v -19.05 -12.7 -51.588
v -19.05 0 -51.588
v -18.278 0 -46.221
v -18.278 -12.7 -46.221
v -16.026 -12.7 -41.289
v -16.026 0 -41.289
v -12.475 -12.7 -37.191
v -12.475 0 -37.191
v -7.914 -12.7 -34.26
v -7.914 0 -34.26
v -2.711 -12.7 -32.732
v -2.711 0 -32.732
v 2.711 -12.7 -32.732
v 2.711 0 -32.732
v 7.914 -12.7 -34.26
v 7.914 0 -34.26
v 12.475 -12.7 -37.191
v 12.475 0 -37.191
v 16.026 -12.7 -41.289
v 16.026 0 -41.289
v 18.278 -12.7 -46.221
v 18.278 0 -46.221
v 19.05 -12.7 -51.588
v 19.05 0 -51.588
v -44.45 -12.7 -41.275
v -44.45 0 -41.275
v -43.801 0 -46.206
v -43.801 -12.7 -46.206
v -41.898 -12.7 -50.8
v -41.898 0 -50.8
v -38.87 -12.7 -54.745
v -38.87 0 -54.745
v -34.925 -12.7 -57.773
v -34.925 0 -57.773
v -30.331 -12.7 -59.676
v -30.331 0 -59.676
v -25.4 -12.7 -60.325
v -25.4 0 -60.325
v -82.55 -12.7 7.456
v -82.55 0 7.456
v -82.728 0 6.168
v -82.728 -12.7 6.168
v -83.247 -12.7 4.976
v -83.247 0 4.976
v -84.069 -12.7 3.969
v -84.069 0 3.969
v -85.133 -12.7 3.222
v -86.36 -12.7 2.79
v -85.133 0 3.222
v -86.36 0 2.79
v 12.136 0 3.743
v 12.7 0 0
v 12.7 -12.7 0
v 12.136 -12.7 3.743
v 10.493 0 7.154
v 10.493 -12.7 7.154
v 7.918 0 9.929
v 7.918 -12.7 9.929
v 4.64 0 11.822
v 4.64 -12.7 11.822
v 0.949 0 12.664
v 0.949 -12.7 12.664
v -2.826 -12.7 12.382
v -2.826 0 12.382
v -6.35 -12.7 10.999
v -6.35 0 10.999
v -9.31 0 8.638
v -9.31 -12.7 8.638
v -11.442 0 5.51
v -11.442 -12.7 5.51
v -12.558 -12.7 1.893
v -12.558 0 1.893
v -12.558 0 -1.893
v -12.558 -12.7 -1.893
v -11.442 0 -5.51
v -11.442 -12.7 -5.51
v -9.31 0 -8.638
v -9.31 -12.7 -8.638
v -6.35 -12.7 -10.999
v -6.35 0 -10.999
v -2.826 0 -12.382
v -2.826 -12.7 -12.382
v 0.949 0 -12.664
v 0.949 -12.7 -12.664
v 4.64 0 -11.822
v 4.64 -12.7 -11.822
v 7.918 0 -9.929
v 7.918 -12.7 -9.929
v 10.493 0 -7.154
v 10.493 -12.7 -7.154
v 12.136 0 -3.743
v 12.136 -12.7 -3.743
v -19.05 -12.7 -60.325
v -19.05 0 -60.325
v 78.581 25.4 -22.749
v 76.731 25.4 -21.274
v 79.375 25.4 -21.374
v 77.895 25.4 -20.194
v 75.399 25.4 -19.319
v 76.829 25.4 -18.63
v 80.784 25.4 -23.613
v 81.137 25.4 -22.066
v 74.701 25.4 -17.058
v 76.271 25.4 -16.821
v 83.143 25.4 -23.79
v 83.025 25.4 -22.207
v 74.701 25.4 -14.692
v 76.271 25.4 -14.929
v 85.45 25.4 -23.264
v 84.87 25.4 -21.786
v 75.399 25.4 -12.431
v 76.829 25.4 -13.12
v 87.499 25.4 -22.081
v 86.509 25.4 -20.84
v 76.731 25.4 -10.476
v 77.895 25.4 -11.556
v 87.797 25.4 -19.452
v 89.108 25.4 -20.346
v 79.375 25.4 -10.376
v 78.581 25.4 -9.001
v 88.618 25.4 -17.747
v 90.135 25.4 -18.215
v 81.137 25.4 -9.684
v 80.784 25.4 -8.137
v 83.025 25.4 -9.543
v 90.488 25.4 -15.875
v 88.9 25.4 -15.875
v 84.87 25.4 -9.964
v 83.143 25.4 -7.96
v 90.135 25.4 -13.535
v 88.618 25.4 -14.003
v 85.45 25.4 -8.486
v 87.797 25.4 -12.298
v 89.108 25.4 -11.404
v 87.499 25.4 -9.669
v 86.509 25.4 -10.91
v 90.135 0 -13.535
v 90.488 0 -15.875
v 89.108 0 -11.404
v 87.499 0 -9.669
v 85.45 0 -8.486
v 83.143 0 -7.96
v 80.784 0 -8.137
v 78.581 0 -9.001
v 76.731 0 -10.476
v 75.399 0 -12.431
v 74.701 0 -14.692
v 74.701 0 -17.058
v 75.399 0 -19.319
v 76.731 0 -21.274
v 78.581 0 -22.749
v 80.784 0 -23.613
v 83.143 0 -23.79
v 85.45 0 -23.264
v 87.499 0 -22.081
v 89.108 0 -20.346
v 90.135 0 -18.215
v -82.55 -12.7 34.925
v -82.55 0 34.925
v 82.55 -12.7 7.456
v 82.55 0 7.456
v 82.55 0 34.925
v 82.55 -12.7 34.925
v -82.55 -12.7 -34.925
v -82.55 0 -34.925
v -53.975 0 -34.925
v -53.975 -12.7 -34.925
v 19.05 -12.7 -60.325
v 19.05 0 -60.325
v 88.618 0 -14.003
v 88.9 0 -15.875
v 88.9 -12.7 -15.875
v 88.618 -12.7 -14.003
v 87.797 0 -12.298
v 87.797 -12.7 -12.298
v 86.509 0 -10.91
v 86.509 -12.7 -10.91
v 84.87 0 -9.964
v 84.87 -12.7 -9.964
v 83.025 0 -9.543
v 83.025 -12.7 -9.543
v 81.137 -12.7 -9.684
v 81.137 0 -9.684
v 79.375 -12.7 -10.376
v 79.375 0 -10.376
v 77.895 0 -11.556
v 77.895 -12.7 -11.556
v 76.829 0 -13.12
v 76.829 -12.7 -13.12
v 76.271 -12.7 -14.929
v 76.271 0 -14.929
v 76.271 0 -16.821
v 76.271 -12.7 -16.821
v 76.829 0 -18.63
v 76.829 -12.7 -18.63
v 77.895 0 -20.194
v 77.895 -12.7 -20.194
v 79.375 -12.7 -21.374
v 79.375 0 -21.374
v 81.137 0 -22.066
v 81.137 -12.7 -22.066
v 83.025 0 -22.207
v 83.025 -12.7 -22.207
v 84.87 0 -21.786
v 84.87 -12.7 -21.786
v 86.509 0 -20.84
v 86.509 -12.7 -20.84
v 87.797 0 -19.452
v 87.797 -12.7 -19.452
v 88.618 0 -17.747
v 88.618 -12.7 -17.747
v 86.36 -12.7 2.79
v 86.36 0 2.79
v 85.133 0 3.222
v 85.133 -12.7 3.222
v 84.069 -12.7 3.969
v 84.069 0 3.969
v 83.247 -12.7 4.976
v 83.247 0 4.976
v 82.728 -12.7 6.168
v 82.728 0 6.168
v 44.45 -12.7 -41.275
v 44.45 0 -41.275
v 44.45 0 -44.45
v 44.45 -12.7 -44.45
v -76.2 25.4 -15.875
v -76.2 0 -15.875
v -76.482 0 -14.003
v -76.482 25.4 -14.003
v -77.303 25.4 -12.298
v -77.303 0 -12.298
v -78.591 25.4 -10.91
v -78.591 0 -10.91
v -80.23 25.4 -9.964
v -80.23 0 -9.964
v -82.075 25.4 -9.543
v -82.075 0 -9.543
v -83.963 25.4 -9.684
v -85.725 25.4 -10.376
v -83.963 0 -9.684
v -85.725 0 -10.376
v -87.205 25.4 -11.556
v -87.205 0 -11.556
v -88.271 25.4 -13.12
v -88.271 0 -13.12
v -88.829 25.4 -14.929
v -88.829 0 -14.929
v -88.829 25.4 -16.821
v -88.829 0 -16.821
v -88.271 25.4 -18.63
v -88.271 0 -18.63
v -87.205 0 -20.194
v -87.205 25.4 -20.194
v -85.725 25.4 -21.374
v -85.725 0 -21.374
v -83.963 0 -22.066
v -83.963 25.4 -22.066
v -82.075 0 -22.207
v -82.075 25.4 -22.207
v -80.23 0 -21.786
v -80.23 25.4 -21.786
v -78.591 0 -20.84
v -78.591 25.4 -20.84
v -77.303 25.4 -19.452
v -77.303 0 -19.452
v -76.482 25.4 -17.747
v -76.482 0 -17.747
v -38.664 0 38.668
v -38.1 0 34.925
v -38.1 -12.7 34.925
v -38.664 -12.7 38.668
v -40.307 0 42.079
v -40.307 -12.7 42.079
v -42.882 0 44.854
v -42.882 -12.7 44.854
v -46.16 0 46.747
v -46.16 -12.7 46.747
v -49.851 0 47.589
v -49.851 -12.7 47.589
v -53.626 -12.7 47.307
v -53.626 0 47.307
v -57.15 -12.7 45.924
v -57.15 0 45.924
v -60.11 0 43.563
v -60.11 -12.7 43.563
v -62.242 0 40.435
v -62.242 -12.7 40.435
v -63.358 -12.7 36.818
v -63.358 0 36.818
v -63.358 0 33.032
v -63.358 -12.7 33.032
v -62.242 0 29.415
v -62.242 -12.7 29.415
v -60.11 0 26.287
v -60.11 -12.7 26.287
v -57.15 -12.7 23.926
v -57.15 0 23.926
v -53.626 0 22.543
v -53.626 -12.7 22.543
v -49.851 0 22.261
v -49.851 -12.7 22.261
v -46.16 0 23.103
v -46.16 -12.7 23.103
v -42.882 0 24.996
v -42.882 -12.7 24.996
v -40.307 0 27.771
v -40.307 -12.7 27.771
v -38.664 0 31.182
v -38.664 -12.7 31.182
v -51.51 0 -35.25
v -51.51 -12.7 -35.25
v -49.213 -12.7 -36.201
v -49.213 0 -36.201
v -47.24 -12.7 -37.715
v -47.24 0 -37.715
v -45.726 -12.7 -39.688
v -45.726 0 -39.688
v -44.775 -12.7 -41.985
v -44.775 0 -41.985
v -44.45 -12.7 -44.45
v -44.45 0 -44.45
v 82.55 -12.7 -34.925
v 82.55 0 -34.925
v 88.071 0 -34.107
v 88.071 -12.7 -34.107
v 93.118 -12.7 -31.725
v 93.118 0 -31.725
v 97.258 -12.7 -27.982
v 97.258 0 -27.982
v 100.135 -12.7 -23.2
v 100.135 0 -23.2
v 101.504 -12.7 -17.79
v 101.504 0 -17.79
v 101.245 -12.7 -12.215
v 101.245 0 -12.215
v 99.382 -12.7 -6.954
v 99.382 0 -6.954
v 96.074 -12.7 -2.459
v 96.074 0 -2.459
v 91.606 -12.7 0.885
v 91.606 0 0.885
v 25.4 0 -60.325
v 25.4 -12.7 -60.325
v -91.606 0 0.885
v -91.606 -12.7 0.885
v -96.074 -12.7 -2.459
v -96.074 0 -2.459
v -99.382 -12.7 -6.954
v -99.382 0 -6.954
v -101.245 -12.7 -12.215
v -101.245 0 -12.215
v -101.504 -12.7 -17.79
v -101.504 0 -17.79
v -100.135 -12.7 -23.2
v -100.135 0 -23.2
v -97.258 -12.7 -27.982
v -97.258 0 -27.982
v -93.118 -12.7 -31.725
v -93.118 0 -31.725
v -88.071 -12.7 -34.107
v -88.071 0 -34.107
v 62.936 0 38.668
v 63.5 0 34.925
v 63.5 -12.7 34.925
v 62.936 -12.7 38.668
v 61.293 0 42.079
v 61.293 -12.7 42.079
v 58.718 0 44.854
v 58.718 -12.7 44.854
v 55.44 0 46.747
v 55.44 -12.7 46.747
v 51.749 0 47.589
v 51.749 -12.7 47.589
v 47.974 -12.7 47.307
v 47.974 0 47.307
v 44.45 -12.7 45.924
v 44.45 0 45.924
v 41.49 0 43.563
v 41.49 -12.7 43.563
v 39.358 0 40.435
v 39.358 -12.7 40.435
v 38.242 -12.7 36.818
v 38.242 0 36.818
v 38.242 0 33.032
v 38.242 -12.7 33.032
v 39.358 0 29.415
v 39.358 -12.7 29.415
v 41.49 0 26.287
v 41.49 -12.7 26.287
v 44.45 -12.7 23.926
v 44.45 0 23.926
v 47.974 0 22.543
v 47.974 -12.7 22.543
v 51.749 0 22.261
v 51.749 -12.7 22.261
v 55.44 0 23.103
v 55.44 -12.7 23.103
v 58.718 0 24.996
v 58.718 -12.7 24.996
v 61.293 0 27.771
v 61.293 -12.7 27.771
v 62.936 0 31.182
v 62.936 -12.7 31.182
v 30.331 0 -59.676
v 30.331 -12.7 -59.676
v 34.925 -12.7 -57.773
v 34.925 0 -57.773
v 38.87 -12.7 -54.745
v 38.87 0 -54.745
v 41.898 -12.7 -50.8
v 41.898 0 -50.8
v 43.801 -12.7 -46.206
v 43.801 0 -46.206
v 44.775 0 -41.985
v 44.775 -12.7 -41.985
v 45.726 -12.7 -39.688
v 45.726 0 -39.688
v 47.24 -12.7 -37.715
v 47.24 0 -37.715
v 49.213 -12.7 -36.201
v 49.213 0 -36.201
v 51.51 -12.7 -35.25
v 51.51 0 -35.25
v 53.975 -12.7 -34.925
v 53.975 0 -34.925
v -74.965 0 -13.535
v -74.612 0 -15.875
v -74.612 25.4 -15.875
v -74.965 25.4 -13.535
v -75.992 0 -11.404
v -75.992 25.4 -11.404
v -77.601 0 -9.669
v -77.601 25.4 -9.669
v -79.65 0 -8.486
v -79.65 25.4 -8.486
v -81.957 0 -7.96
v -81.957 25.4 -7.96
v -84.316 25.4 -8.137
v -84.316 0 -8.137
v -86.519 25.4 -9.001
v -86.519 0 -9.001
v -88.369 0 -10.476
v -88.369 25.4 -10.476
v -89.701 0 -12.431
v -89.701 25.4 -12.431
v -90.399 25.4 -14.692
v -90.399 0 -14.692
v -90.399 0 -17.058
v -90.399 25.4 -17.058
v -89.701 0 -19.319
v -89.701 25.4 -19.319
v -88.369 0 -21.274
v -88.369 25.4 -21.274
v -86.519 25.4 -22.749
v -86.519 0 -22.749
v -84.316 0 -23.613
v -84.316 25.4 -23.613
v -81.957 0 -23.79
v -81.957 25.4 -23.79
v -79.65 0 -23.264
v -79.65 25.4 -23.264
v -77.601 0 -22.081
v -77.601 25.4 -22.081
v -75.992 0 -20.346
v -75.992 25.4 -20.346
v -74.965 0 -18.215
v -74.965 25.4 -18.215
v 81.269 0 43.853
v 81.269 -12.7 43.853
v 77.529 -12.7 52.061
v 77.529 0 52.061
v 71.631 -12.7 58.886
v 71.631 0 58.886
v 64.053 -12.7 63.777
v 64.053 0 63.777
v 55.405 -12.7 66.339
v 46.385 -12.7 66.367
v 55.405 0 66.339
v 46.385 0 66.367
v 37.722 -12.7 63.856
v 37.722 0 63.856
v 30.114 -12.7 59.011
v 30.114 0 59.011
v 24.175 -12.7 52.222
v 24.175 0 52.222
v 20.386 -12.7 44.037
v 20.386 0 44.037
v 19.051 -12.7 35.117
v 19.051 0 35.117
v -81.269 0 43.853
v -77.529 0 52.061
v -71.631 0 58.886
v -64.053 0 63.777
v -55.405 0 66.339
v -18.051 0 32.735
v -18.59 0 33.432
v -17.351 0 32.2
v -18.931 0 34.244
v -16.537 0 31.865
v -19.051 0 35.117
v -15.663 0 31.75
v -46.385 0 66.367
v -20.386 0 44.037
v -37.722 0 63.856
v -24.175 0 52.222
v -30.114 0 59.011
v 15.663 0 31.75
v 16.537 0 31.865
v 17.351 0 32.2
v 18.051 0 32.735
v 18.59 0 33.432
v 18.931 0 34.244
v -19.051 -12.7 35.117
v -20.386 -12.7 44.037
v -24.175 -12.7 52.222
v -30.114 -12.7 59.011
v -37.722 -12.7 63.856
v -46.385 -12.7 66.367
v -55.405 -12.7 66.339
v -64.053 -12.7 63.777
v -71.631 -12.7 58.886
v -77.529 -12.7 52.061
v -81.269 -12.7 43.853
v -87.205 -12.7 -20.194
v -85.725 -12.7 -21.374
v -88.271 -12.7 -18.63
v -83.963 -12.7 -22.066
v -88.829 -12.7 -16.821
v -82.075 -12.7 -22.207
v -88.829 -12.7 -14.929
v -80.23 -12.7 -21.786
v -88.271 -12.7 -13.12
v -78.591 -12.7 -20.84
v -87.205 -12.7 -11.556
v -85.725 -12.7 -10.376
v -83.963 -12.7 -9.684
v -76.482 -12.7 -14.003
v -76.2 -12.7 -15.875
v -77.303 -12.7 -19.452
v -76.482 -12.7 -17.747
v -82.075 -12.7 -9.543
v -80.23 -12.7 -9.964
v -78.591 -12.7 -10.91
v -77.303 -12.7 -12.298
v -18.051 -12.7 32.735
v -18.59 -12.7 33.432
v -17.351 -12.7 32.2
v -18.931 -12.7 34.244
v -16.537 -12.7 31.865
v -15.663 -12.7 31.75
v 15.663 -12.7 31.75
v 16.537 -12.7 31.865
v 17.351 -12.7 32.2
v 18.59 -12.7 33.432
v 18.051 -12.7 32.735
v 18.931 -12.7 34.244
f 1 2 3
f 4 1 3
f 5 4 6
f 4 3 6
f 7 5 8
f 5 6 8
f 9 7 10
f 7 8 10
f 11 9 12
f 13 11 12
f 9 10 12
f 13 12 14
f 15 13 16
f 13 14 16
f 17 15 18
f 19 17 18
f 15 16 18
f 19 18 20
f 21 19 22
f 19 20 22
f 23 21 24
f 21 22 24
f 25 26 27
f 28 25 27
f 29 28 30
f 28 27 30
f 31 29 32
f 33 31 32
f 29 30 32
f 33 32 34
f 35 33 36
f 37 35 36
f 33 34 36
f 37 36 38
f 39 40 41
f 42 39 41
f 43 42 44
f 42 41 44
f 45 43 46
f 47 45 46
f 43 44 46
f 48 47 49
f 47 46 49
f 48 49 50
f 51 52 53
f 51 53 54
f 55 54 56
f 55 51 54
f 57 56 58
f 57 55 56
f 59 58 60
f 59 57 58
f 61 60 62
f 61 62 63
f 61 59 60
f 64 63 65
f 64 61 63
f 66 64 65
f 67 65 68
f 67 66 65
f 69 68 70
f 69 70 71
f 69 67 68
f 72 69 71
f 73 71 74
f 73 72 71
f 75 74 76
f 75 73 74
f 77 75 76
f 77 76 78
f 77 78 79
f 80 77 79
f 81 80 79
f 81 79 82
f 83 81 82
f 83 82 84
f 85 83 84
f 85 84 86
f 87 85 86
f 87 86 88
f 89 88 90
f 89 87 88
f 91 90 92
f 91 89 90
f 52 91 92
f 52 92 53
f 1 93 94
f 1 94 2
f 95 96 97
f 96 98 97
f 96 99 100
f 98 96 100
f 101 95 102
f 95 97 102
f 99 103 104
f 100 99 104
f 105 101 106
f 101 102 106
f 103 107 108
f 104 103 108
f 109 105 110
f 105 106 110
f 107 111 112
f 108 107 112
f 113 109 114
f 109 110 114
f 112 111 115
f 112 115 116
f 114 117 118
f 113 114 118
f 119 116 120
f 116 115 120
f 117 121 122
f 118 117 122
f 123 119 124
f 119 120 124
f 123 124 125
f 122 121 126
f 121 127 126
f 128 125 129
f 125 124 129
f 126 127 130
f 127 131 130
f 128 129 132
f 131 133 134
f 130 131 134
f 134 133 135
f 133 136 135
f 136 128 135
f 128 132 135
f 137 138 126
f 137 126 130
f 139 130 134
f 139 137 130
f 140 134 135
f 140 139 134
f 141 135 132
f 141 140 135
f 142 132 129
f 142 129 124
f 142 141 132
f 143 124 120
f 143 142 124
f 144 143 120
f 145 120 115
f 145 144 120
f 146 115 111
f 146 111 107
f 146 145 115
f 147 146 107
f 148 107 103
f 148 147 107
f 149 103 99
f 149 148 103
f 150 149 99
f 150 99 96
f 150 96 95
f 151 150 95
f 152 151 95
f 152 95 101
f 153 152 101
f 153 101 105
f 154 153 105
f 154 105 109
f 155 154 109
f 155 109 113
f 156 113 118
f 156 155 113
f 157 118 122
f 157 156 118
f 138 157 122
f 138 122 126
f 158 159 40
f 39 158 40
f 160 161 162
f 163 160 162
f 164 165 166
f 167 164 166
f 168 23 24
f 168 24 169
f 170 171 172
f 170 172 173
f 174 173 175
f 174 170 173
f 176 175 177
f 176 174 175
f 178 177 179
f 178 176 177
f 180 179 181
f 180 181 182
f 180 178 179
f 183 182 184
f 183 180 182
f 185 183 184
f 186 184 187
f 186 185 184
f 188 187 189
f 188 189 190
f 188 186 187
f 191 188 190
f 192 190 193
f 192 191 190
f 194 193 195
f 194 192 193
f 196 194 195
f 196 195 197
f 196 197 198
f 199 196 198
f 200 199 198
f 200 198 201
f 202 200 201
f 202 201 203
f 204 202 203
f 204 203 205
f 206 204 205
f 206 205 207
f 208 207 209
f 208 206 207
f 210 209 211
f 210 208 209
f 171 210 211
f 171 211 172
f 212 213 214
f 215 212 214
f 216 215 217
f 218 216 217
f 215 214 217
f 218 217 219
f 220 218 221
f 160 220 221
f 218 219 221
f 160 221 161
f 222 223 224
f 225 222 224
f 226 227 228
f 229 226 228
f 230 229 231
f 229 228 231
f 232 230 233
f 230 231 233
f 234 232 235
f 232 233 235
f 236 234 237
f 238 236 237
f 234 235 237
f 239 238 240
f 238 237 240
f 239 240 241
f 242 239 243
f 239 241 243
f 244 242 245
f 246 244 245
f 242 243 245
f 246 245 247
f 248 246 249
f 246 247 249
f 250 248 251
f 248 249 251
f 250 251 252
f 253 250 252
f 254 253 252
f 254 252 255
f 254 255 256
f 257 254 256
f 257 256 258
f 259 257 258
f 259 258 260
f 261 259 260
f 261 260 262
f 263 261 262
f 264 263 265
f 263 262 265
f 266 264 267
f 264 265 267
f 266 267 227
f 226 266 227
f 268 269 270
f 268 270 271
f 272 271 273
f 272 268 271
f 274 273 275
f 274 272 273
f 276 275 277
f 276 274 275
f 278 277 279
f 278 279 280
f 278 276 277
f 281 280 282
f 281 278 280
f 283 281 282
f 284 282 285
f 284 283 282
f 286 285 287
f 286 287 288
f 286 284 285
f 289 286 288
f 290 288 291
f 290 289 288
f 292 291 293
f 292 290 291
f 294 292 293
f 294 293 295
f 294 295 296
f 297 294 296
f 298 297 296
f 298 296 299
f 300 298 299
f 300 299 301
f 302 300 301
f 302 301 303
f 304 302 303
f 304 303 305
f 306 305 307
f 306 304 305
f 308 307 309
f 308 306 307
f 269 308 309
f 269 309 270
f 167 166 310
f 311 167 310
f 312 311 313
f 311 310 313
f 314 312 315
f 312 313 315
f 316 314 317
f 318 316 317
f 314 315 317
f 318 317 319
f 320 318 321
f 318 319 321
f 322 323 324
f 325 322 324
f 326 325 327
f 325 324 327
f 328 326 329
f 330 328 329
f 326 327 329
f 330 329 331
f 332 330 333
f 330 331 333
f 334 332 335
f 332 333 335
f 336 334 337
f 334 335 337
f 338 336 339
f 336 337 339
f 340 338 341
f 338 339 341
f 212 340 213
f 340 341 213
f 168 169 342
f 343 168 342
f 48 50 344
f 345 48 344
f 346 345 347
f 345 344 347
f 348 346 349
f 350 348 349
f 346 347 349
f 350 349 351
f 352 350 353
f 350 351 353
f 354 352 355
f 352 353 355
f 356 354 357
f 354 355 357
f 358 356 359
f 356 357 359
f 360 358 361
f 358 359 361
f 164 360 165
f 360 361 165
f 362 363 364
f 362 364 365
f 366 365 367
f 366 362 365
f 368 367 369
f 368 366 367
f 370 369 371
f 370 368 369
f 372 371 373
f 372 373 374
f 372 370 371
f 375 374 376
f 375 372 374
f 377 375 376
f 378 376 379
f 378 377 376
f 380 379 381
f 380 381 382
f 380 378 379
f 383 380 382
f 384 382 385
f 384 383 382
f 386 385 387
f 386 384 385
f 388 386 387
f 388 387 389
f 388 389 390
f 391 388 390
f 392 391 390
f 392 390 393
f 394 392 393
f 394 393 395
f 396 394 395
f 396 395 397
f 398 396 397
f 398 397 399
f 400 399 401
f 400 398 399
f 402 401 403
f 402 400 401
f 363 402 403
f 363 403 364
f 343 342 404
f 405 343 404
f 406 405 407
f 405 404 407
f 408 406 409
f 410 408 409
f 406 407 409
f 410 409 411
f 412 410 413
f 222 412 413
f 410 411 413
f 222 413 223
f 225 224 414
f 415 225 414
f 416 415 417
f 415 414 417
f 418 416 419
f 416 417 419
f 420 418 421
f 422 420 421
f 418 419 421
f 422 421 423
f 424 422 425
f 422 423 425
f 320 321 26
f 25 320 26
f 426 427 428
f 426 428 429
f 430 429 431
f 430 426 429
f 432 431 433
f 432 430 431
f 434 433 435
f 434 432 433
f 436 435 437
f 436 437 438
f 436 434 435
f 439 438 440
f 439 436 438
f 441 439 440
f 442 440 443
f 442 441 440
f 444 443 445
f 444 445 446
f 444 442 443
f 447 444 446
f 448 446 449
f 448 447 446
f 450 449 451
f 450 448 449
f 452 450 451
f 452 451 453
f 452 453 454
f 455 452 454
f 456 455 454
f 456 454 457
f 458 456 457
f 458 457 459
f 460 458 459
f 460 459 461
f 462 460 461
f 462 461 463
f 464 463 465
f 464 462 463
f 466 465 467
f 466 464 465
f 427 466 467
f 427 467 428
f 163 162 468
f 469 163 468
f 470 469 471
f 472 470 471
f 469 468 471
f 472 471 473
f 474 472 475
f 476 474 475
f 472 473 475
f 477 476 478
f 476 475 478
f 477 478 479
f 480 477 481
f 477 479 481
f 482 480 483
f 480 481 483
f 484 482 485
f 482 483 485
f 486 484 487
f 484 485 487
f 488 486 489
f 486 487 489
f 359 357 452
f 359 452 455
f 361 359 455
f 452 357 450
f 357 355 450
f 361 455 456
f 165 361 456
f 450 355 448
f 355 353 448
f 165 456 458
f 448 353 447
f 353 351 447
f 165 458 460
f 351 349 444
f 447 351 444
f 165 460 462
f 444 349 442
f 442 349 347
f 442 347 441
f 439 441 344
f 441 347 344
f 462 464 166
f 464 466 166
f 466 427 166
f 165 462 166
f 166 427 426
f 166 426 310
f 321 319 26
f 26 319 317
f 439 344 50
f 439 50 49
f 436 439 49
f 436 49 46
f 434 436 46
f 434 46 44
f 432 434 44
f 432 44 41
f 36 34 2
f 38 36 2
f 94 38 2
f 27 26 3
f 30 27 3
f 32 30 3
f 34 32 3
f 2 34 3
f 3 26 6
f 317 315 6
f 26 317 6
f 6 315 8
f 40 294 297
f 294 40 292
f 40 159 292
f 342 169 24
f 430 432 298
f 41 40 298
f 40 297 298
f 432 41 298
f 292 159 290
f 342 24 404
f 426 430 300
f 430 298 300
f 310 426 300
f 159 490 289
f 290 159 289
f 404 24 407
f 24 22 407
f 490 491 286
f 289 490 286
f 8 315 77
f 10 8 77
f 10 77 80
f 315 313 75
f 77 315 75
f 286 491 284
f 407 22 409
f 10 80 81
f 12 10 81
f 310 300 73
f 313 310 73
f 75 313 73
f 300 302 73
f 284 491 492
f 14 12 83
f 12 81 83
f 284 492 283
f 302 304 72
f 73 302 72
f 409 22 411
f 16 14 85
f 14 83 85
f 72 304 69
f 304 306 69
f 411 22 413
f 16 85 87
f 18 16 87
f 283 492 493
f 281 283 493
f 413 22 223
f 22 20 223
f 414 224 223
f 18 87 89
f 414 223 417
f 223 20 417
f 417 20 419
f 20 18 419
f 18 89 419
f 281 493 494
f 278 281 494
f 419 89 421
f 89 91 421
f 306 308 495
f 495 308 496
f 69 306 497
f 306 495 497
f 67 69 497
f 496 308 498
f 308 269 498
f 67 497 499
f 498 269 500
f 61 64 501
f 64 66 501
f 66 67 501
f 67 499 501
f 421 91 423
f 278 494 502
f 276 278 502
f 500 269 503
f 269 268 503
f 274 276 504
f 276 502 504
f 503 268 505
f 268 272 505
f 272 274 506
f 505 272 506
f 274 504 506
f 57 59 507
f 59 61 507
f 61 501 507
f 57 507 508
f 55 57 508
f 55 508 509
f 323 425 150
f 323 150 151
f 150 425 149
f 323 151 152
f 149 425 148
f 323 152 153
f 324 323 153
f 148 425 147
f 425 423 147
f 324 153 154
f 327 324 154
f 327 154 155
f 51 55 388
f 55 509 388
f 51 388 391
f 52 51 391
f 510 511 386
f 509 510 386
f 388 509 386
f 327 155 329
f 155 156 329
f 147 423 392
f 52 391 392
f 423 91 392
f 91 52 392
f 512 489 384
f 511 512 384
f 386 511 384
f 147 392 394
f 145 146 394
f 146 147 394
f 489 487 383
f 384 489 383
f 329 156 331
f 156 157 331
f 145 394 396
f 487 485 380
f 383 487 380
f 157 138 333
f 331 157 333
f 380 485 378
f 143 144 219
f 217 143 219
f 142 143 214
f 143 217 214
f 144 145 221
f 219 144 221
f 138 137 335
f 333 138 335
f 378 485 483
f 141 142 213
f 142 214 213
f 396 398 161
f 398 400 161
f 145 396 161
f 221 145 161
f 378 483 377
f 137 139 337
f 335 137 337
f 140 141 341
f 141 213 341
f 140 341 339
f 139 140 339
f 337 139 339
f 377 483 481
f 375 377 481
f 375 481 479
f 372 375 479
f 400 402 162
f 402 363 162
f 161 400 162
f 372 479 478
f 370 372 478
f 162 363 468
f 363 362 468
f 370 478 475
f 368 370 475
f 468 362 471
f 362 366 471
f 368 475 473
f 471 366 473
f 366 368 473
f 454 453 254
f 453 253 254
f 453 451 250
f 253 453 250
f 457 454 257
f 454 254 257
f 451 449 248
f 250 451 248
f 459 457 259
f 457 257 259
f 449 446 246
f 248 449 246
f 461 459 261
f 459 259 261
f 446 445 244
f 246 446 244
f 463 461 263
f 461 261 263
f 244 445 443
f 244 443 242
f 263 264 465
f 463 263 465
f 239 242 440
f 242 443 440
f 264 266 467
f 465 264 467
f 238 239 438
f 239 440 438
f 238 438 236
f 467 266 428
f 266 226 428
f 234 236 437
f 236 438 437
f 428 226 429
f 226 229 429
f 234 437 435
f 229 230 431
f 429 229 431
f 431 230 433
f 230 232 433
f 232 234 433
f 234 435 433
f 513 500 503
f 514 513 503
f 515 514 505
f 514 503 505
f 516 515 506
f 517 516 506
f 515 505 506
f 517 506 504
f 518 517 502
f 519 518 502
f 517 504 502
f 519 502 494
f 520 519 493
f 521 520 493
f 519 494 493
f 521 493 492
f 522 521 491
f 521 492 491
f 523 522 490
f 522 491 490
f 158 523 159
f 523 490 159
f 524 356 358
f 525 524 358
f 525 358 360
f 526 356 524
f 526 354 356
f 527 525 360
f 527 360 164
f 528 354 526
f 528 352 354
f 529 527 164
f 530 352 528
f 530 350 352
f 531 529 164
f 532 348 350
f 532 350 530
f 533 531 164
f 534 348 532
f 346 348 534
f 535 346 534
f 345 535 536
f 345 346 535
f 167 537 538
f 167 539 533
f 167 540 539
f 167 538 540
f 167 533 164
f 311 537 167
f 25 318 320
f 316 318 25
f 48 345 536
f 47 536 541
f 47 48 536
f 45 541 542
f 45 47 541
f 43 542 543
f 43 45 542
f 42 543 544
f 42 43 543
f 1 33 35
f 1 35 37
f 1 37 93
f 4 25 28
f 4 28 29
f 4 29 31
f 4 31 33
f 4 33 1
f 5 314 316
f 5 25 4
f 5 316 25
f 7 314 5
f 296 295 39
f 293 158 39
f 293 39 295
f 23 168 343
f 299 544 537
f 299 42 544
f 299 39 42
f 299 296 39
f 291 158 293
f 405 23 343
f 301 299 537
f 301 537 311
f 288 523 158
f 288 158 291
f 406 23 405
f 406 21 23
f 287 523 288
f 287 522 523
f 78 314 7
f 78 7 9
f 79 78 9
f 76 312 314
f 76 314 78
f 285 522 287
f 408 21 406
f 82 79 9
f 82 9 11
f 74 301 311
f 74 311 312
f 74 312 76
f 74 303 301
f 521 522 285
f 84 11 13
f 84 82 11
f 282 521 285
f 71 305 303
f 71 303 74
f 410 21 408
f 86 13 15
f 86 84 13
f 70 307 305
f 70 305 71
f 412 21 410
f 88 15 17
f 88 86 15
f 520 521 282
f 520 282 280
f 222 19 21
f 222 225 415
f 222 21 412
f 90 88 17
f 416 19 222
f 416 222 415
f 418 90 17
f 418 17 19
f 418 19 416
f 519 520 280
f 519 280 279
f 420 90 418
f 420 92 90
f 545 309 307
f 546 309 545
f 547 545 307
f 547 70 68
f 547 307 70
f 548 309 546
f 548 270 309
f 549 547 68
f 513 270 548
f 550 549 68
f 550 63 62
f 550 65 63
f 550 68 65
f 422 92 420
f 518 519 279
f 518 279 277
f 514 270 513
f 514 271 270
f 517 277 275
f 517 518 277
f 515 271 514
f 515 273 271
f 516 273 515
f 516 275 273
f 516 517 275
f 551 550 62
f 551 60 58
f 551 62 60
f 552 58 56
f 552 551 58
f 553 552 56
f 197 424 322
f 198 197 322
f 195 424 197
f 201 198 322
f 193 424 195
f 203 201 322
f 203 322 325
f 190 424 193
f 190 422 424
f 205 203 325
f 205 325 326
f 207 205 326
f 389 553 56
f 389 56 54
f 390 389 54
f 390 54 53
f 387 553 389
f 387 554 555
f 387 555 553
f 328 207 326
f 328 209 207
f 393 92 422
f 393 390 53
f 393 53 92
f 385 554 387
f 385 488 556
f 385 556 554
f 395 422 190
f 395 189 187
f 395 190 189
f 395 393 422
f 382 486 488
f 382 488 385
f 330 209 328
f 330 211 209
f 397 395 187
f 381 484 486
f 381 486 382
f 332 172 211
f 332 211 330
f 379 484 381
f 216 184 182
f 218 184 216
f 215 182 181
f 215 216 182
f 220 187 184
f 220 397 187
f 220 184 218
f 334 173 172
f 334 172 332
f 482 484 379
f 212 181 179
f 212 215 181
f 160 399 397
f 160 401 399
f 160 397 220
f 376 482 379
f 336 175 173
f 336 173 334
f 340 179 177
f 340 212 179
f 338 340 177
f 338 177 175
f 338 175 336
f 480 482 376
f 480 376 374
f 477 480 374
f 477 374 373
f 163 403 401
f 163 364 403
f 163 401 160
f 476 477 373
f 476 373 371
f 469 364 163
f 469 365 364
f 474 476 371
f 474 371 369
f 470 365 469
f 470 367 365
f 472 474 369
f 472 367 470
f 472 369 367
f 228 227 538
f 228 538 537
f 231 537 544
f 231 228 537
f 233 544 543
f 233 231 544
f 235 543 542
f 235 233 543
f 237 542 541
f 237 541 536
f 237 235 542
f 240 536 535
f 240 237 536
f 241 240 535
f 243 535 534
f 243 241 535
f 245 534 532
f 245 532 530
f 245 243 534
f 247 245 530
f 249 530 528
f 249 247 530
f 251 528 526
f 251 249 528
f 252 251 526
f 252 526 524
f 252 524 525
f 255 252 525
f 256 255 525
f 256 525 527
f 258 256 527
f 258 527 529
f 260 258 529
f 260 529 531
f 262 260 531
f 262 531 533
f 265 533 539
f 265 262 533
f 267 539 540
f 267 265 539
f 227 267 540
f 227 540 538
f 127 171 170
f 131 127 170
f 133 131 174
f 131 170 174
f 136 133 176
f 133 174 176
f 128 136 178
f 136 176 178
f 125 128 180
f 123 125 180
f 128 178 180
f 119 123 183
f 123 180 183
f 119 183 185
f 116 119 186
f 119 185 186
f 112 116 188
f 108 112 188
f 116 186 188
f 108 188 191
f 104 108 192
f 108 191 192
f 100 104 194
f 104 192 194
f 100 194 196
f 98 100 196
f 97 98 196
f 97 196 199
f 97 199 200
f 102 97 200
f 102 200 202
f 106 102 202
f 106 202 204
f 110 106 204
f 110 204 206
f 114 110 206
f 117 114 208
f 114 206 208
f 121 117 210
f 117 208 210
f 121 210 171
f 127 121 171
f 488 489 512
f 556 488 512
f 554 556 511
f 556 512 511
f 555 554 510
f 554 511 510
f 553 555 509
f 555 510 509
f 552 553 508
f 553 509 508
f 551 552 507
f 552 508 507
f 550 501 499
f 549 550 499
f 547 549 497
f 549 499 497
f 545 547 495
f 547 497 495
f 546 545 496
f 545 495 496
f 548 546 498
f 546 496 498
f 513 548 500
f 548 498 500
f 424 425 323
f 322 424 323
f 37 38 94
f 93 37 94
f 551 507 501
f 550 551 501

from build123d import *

# Parameters (mm, degrees)
F0_R     = 7.9375
F0_R_2   = 12.7
F0_R_3   = 6.35
F1_DEPTH = 12.7
F2_DEPTH = 25.4


with BuildPart() as f1:
    # F0 (on Front) → F1 (new body)
    with BuildSketch(Plane.XZ):
        with BuildLine():
            Line((82.55, 7.45639), (82.55, 34.925))
            ThreePointArc((82.55, 34.925), (50.896024, 66.674855), (19.050581, 35.117047))
            ThreePointArc((19.050581, 35.117047), (18.051201, 32.734953), (15.663106, 31.75))
            Line((15.663106, 31.75), (0, 31.75))
            Line((0, 31.75), (-15.663106, 31.75))
            ThreePointArc((-15.663106, 31.75), (-18.051201, 32.734953), (-19.050581, 35.117047))
            ThreePointArc((-19.050581, 35.117047), (-50.896024, 66.674855), (-82.55, 34.925))
            Line((-82.55, 34.925), (-82.55, 7.45639))
            ThreePointArc((-82.55, 7.45639), (-83.623483, 4.44432), (-86.36, 2.790112))
            ThreePointArc((-86.36, 2.790112), (-101.503534, -17.789696), (-82.55, -34.925))
            Line((-82.55, -34.925), (-53.975, -34.925))
            ThreePointArc((-53.975, -34.925), (-47.239808, -37.714808), (-44.45, -44.45))
            Line((-44.45, -44.45), (-44.45, -41.275))
            ThreePointArc((-44.45, -41.275), (-38.870384, -54.745384), (-25.4, -60.325))
            Line((-25.4, -60.325), (-19.05, -60.325))
            Line((-19.05, -60.325), (-19.05, -51.58833))
            ThreePointArc((-19.05, -51.58833), (0, -32.53833), (19.05, -51.58833))
            Line((19.05, -51.58833), (19.05, -60.325))
            Line((19.05, -60.325), (25.4, -60.325))
            ThreePointArc((25.4, -60.325), (38.870384, -54.745384), (44.45, -41.275))
            Line((44.45, -41.275), (44.45, -44.45))
            ThreePointArc((44.45, -44.45), (47.239808, -37.714808), (53.975, -34.925))
            Line((53.975, -34.925), (82.55, -34.925))
            ThreePointArc((82.55, -34.925), (101.503534, -17.789696), (86.36, 2.790112))
            ThreePointArc((86.36, 2.790112), (83.623483, 4.44432), (82.55, 7.45639))
        make_face()
        with Locations((-82.55, -15.875)):
            Circle(F0_R, mode=Mode.SUBTRACT)
        Circle(F0_R_2, mode=Mode.SUBTRACT)
        with Locations((82.55, -15.875)):
            Circle(F0_R, mode=Mode.SUBTRACT)
        with Locations((-50.8, 34.925)):
            Circle(F0_R_2, mode=Mode.SUBTRACT)
        with Locations((50.8, 34.925)):
            Circle(F0_R_2, mode=Mode.SUBTRACT)
        with Locations((-82.55, -15.875)):
            Circle(F0_R)
        with Locations((-82.55, -15.875)):
            Circle(F0_R_3, mode=Mode.SUBTRACT)
        with Locations((82.55, -15.875)):
            Circle(F0_R)
        with Locations((82.55, -15.875)):
            Circle(F0_R_3, mode=Mode.SUBTRACT)
    extrude(amount=F1_DEPTH)

    # F0 (on Front) → F2 (join)
    with BuildSketch(Plane.XZ):
        with Locations((82.55, -15.875)):
            Circle(F0_R)
        with Locations((82.55, -15.875)):
            Circle(F0_R_3, mode=Mode.SUBTRACT)
        with Locations((-82.55, -15.875)):
            Circle(F0_R)
        with Locations((-82.55, -15.875)):
            Circle(F0_R_3, mode=Mode.SUBTRACT)
    extrude(amount=-F2_DEPTH)


solid = f1.part
